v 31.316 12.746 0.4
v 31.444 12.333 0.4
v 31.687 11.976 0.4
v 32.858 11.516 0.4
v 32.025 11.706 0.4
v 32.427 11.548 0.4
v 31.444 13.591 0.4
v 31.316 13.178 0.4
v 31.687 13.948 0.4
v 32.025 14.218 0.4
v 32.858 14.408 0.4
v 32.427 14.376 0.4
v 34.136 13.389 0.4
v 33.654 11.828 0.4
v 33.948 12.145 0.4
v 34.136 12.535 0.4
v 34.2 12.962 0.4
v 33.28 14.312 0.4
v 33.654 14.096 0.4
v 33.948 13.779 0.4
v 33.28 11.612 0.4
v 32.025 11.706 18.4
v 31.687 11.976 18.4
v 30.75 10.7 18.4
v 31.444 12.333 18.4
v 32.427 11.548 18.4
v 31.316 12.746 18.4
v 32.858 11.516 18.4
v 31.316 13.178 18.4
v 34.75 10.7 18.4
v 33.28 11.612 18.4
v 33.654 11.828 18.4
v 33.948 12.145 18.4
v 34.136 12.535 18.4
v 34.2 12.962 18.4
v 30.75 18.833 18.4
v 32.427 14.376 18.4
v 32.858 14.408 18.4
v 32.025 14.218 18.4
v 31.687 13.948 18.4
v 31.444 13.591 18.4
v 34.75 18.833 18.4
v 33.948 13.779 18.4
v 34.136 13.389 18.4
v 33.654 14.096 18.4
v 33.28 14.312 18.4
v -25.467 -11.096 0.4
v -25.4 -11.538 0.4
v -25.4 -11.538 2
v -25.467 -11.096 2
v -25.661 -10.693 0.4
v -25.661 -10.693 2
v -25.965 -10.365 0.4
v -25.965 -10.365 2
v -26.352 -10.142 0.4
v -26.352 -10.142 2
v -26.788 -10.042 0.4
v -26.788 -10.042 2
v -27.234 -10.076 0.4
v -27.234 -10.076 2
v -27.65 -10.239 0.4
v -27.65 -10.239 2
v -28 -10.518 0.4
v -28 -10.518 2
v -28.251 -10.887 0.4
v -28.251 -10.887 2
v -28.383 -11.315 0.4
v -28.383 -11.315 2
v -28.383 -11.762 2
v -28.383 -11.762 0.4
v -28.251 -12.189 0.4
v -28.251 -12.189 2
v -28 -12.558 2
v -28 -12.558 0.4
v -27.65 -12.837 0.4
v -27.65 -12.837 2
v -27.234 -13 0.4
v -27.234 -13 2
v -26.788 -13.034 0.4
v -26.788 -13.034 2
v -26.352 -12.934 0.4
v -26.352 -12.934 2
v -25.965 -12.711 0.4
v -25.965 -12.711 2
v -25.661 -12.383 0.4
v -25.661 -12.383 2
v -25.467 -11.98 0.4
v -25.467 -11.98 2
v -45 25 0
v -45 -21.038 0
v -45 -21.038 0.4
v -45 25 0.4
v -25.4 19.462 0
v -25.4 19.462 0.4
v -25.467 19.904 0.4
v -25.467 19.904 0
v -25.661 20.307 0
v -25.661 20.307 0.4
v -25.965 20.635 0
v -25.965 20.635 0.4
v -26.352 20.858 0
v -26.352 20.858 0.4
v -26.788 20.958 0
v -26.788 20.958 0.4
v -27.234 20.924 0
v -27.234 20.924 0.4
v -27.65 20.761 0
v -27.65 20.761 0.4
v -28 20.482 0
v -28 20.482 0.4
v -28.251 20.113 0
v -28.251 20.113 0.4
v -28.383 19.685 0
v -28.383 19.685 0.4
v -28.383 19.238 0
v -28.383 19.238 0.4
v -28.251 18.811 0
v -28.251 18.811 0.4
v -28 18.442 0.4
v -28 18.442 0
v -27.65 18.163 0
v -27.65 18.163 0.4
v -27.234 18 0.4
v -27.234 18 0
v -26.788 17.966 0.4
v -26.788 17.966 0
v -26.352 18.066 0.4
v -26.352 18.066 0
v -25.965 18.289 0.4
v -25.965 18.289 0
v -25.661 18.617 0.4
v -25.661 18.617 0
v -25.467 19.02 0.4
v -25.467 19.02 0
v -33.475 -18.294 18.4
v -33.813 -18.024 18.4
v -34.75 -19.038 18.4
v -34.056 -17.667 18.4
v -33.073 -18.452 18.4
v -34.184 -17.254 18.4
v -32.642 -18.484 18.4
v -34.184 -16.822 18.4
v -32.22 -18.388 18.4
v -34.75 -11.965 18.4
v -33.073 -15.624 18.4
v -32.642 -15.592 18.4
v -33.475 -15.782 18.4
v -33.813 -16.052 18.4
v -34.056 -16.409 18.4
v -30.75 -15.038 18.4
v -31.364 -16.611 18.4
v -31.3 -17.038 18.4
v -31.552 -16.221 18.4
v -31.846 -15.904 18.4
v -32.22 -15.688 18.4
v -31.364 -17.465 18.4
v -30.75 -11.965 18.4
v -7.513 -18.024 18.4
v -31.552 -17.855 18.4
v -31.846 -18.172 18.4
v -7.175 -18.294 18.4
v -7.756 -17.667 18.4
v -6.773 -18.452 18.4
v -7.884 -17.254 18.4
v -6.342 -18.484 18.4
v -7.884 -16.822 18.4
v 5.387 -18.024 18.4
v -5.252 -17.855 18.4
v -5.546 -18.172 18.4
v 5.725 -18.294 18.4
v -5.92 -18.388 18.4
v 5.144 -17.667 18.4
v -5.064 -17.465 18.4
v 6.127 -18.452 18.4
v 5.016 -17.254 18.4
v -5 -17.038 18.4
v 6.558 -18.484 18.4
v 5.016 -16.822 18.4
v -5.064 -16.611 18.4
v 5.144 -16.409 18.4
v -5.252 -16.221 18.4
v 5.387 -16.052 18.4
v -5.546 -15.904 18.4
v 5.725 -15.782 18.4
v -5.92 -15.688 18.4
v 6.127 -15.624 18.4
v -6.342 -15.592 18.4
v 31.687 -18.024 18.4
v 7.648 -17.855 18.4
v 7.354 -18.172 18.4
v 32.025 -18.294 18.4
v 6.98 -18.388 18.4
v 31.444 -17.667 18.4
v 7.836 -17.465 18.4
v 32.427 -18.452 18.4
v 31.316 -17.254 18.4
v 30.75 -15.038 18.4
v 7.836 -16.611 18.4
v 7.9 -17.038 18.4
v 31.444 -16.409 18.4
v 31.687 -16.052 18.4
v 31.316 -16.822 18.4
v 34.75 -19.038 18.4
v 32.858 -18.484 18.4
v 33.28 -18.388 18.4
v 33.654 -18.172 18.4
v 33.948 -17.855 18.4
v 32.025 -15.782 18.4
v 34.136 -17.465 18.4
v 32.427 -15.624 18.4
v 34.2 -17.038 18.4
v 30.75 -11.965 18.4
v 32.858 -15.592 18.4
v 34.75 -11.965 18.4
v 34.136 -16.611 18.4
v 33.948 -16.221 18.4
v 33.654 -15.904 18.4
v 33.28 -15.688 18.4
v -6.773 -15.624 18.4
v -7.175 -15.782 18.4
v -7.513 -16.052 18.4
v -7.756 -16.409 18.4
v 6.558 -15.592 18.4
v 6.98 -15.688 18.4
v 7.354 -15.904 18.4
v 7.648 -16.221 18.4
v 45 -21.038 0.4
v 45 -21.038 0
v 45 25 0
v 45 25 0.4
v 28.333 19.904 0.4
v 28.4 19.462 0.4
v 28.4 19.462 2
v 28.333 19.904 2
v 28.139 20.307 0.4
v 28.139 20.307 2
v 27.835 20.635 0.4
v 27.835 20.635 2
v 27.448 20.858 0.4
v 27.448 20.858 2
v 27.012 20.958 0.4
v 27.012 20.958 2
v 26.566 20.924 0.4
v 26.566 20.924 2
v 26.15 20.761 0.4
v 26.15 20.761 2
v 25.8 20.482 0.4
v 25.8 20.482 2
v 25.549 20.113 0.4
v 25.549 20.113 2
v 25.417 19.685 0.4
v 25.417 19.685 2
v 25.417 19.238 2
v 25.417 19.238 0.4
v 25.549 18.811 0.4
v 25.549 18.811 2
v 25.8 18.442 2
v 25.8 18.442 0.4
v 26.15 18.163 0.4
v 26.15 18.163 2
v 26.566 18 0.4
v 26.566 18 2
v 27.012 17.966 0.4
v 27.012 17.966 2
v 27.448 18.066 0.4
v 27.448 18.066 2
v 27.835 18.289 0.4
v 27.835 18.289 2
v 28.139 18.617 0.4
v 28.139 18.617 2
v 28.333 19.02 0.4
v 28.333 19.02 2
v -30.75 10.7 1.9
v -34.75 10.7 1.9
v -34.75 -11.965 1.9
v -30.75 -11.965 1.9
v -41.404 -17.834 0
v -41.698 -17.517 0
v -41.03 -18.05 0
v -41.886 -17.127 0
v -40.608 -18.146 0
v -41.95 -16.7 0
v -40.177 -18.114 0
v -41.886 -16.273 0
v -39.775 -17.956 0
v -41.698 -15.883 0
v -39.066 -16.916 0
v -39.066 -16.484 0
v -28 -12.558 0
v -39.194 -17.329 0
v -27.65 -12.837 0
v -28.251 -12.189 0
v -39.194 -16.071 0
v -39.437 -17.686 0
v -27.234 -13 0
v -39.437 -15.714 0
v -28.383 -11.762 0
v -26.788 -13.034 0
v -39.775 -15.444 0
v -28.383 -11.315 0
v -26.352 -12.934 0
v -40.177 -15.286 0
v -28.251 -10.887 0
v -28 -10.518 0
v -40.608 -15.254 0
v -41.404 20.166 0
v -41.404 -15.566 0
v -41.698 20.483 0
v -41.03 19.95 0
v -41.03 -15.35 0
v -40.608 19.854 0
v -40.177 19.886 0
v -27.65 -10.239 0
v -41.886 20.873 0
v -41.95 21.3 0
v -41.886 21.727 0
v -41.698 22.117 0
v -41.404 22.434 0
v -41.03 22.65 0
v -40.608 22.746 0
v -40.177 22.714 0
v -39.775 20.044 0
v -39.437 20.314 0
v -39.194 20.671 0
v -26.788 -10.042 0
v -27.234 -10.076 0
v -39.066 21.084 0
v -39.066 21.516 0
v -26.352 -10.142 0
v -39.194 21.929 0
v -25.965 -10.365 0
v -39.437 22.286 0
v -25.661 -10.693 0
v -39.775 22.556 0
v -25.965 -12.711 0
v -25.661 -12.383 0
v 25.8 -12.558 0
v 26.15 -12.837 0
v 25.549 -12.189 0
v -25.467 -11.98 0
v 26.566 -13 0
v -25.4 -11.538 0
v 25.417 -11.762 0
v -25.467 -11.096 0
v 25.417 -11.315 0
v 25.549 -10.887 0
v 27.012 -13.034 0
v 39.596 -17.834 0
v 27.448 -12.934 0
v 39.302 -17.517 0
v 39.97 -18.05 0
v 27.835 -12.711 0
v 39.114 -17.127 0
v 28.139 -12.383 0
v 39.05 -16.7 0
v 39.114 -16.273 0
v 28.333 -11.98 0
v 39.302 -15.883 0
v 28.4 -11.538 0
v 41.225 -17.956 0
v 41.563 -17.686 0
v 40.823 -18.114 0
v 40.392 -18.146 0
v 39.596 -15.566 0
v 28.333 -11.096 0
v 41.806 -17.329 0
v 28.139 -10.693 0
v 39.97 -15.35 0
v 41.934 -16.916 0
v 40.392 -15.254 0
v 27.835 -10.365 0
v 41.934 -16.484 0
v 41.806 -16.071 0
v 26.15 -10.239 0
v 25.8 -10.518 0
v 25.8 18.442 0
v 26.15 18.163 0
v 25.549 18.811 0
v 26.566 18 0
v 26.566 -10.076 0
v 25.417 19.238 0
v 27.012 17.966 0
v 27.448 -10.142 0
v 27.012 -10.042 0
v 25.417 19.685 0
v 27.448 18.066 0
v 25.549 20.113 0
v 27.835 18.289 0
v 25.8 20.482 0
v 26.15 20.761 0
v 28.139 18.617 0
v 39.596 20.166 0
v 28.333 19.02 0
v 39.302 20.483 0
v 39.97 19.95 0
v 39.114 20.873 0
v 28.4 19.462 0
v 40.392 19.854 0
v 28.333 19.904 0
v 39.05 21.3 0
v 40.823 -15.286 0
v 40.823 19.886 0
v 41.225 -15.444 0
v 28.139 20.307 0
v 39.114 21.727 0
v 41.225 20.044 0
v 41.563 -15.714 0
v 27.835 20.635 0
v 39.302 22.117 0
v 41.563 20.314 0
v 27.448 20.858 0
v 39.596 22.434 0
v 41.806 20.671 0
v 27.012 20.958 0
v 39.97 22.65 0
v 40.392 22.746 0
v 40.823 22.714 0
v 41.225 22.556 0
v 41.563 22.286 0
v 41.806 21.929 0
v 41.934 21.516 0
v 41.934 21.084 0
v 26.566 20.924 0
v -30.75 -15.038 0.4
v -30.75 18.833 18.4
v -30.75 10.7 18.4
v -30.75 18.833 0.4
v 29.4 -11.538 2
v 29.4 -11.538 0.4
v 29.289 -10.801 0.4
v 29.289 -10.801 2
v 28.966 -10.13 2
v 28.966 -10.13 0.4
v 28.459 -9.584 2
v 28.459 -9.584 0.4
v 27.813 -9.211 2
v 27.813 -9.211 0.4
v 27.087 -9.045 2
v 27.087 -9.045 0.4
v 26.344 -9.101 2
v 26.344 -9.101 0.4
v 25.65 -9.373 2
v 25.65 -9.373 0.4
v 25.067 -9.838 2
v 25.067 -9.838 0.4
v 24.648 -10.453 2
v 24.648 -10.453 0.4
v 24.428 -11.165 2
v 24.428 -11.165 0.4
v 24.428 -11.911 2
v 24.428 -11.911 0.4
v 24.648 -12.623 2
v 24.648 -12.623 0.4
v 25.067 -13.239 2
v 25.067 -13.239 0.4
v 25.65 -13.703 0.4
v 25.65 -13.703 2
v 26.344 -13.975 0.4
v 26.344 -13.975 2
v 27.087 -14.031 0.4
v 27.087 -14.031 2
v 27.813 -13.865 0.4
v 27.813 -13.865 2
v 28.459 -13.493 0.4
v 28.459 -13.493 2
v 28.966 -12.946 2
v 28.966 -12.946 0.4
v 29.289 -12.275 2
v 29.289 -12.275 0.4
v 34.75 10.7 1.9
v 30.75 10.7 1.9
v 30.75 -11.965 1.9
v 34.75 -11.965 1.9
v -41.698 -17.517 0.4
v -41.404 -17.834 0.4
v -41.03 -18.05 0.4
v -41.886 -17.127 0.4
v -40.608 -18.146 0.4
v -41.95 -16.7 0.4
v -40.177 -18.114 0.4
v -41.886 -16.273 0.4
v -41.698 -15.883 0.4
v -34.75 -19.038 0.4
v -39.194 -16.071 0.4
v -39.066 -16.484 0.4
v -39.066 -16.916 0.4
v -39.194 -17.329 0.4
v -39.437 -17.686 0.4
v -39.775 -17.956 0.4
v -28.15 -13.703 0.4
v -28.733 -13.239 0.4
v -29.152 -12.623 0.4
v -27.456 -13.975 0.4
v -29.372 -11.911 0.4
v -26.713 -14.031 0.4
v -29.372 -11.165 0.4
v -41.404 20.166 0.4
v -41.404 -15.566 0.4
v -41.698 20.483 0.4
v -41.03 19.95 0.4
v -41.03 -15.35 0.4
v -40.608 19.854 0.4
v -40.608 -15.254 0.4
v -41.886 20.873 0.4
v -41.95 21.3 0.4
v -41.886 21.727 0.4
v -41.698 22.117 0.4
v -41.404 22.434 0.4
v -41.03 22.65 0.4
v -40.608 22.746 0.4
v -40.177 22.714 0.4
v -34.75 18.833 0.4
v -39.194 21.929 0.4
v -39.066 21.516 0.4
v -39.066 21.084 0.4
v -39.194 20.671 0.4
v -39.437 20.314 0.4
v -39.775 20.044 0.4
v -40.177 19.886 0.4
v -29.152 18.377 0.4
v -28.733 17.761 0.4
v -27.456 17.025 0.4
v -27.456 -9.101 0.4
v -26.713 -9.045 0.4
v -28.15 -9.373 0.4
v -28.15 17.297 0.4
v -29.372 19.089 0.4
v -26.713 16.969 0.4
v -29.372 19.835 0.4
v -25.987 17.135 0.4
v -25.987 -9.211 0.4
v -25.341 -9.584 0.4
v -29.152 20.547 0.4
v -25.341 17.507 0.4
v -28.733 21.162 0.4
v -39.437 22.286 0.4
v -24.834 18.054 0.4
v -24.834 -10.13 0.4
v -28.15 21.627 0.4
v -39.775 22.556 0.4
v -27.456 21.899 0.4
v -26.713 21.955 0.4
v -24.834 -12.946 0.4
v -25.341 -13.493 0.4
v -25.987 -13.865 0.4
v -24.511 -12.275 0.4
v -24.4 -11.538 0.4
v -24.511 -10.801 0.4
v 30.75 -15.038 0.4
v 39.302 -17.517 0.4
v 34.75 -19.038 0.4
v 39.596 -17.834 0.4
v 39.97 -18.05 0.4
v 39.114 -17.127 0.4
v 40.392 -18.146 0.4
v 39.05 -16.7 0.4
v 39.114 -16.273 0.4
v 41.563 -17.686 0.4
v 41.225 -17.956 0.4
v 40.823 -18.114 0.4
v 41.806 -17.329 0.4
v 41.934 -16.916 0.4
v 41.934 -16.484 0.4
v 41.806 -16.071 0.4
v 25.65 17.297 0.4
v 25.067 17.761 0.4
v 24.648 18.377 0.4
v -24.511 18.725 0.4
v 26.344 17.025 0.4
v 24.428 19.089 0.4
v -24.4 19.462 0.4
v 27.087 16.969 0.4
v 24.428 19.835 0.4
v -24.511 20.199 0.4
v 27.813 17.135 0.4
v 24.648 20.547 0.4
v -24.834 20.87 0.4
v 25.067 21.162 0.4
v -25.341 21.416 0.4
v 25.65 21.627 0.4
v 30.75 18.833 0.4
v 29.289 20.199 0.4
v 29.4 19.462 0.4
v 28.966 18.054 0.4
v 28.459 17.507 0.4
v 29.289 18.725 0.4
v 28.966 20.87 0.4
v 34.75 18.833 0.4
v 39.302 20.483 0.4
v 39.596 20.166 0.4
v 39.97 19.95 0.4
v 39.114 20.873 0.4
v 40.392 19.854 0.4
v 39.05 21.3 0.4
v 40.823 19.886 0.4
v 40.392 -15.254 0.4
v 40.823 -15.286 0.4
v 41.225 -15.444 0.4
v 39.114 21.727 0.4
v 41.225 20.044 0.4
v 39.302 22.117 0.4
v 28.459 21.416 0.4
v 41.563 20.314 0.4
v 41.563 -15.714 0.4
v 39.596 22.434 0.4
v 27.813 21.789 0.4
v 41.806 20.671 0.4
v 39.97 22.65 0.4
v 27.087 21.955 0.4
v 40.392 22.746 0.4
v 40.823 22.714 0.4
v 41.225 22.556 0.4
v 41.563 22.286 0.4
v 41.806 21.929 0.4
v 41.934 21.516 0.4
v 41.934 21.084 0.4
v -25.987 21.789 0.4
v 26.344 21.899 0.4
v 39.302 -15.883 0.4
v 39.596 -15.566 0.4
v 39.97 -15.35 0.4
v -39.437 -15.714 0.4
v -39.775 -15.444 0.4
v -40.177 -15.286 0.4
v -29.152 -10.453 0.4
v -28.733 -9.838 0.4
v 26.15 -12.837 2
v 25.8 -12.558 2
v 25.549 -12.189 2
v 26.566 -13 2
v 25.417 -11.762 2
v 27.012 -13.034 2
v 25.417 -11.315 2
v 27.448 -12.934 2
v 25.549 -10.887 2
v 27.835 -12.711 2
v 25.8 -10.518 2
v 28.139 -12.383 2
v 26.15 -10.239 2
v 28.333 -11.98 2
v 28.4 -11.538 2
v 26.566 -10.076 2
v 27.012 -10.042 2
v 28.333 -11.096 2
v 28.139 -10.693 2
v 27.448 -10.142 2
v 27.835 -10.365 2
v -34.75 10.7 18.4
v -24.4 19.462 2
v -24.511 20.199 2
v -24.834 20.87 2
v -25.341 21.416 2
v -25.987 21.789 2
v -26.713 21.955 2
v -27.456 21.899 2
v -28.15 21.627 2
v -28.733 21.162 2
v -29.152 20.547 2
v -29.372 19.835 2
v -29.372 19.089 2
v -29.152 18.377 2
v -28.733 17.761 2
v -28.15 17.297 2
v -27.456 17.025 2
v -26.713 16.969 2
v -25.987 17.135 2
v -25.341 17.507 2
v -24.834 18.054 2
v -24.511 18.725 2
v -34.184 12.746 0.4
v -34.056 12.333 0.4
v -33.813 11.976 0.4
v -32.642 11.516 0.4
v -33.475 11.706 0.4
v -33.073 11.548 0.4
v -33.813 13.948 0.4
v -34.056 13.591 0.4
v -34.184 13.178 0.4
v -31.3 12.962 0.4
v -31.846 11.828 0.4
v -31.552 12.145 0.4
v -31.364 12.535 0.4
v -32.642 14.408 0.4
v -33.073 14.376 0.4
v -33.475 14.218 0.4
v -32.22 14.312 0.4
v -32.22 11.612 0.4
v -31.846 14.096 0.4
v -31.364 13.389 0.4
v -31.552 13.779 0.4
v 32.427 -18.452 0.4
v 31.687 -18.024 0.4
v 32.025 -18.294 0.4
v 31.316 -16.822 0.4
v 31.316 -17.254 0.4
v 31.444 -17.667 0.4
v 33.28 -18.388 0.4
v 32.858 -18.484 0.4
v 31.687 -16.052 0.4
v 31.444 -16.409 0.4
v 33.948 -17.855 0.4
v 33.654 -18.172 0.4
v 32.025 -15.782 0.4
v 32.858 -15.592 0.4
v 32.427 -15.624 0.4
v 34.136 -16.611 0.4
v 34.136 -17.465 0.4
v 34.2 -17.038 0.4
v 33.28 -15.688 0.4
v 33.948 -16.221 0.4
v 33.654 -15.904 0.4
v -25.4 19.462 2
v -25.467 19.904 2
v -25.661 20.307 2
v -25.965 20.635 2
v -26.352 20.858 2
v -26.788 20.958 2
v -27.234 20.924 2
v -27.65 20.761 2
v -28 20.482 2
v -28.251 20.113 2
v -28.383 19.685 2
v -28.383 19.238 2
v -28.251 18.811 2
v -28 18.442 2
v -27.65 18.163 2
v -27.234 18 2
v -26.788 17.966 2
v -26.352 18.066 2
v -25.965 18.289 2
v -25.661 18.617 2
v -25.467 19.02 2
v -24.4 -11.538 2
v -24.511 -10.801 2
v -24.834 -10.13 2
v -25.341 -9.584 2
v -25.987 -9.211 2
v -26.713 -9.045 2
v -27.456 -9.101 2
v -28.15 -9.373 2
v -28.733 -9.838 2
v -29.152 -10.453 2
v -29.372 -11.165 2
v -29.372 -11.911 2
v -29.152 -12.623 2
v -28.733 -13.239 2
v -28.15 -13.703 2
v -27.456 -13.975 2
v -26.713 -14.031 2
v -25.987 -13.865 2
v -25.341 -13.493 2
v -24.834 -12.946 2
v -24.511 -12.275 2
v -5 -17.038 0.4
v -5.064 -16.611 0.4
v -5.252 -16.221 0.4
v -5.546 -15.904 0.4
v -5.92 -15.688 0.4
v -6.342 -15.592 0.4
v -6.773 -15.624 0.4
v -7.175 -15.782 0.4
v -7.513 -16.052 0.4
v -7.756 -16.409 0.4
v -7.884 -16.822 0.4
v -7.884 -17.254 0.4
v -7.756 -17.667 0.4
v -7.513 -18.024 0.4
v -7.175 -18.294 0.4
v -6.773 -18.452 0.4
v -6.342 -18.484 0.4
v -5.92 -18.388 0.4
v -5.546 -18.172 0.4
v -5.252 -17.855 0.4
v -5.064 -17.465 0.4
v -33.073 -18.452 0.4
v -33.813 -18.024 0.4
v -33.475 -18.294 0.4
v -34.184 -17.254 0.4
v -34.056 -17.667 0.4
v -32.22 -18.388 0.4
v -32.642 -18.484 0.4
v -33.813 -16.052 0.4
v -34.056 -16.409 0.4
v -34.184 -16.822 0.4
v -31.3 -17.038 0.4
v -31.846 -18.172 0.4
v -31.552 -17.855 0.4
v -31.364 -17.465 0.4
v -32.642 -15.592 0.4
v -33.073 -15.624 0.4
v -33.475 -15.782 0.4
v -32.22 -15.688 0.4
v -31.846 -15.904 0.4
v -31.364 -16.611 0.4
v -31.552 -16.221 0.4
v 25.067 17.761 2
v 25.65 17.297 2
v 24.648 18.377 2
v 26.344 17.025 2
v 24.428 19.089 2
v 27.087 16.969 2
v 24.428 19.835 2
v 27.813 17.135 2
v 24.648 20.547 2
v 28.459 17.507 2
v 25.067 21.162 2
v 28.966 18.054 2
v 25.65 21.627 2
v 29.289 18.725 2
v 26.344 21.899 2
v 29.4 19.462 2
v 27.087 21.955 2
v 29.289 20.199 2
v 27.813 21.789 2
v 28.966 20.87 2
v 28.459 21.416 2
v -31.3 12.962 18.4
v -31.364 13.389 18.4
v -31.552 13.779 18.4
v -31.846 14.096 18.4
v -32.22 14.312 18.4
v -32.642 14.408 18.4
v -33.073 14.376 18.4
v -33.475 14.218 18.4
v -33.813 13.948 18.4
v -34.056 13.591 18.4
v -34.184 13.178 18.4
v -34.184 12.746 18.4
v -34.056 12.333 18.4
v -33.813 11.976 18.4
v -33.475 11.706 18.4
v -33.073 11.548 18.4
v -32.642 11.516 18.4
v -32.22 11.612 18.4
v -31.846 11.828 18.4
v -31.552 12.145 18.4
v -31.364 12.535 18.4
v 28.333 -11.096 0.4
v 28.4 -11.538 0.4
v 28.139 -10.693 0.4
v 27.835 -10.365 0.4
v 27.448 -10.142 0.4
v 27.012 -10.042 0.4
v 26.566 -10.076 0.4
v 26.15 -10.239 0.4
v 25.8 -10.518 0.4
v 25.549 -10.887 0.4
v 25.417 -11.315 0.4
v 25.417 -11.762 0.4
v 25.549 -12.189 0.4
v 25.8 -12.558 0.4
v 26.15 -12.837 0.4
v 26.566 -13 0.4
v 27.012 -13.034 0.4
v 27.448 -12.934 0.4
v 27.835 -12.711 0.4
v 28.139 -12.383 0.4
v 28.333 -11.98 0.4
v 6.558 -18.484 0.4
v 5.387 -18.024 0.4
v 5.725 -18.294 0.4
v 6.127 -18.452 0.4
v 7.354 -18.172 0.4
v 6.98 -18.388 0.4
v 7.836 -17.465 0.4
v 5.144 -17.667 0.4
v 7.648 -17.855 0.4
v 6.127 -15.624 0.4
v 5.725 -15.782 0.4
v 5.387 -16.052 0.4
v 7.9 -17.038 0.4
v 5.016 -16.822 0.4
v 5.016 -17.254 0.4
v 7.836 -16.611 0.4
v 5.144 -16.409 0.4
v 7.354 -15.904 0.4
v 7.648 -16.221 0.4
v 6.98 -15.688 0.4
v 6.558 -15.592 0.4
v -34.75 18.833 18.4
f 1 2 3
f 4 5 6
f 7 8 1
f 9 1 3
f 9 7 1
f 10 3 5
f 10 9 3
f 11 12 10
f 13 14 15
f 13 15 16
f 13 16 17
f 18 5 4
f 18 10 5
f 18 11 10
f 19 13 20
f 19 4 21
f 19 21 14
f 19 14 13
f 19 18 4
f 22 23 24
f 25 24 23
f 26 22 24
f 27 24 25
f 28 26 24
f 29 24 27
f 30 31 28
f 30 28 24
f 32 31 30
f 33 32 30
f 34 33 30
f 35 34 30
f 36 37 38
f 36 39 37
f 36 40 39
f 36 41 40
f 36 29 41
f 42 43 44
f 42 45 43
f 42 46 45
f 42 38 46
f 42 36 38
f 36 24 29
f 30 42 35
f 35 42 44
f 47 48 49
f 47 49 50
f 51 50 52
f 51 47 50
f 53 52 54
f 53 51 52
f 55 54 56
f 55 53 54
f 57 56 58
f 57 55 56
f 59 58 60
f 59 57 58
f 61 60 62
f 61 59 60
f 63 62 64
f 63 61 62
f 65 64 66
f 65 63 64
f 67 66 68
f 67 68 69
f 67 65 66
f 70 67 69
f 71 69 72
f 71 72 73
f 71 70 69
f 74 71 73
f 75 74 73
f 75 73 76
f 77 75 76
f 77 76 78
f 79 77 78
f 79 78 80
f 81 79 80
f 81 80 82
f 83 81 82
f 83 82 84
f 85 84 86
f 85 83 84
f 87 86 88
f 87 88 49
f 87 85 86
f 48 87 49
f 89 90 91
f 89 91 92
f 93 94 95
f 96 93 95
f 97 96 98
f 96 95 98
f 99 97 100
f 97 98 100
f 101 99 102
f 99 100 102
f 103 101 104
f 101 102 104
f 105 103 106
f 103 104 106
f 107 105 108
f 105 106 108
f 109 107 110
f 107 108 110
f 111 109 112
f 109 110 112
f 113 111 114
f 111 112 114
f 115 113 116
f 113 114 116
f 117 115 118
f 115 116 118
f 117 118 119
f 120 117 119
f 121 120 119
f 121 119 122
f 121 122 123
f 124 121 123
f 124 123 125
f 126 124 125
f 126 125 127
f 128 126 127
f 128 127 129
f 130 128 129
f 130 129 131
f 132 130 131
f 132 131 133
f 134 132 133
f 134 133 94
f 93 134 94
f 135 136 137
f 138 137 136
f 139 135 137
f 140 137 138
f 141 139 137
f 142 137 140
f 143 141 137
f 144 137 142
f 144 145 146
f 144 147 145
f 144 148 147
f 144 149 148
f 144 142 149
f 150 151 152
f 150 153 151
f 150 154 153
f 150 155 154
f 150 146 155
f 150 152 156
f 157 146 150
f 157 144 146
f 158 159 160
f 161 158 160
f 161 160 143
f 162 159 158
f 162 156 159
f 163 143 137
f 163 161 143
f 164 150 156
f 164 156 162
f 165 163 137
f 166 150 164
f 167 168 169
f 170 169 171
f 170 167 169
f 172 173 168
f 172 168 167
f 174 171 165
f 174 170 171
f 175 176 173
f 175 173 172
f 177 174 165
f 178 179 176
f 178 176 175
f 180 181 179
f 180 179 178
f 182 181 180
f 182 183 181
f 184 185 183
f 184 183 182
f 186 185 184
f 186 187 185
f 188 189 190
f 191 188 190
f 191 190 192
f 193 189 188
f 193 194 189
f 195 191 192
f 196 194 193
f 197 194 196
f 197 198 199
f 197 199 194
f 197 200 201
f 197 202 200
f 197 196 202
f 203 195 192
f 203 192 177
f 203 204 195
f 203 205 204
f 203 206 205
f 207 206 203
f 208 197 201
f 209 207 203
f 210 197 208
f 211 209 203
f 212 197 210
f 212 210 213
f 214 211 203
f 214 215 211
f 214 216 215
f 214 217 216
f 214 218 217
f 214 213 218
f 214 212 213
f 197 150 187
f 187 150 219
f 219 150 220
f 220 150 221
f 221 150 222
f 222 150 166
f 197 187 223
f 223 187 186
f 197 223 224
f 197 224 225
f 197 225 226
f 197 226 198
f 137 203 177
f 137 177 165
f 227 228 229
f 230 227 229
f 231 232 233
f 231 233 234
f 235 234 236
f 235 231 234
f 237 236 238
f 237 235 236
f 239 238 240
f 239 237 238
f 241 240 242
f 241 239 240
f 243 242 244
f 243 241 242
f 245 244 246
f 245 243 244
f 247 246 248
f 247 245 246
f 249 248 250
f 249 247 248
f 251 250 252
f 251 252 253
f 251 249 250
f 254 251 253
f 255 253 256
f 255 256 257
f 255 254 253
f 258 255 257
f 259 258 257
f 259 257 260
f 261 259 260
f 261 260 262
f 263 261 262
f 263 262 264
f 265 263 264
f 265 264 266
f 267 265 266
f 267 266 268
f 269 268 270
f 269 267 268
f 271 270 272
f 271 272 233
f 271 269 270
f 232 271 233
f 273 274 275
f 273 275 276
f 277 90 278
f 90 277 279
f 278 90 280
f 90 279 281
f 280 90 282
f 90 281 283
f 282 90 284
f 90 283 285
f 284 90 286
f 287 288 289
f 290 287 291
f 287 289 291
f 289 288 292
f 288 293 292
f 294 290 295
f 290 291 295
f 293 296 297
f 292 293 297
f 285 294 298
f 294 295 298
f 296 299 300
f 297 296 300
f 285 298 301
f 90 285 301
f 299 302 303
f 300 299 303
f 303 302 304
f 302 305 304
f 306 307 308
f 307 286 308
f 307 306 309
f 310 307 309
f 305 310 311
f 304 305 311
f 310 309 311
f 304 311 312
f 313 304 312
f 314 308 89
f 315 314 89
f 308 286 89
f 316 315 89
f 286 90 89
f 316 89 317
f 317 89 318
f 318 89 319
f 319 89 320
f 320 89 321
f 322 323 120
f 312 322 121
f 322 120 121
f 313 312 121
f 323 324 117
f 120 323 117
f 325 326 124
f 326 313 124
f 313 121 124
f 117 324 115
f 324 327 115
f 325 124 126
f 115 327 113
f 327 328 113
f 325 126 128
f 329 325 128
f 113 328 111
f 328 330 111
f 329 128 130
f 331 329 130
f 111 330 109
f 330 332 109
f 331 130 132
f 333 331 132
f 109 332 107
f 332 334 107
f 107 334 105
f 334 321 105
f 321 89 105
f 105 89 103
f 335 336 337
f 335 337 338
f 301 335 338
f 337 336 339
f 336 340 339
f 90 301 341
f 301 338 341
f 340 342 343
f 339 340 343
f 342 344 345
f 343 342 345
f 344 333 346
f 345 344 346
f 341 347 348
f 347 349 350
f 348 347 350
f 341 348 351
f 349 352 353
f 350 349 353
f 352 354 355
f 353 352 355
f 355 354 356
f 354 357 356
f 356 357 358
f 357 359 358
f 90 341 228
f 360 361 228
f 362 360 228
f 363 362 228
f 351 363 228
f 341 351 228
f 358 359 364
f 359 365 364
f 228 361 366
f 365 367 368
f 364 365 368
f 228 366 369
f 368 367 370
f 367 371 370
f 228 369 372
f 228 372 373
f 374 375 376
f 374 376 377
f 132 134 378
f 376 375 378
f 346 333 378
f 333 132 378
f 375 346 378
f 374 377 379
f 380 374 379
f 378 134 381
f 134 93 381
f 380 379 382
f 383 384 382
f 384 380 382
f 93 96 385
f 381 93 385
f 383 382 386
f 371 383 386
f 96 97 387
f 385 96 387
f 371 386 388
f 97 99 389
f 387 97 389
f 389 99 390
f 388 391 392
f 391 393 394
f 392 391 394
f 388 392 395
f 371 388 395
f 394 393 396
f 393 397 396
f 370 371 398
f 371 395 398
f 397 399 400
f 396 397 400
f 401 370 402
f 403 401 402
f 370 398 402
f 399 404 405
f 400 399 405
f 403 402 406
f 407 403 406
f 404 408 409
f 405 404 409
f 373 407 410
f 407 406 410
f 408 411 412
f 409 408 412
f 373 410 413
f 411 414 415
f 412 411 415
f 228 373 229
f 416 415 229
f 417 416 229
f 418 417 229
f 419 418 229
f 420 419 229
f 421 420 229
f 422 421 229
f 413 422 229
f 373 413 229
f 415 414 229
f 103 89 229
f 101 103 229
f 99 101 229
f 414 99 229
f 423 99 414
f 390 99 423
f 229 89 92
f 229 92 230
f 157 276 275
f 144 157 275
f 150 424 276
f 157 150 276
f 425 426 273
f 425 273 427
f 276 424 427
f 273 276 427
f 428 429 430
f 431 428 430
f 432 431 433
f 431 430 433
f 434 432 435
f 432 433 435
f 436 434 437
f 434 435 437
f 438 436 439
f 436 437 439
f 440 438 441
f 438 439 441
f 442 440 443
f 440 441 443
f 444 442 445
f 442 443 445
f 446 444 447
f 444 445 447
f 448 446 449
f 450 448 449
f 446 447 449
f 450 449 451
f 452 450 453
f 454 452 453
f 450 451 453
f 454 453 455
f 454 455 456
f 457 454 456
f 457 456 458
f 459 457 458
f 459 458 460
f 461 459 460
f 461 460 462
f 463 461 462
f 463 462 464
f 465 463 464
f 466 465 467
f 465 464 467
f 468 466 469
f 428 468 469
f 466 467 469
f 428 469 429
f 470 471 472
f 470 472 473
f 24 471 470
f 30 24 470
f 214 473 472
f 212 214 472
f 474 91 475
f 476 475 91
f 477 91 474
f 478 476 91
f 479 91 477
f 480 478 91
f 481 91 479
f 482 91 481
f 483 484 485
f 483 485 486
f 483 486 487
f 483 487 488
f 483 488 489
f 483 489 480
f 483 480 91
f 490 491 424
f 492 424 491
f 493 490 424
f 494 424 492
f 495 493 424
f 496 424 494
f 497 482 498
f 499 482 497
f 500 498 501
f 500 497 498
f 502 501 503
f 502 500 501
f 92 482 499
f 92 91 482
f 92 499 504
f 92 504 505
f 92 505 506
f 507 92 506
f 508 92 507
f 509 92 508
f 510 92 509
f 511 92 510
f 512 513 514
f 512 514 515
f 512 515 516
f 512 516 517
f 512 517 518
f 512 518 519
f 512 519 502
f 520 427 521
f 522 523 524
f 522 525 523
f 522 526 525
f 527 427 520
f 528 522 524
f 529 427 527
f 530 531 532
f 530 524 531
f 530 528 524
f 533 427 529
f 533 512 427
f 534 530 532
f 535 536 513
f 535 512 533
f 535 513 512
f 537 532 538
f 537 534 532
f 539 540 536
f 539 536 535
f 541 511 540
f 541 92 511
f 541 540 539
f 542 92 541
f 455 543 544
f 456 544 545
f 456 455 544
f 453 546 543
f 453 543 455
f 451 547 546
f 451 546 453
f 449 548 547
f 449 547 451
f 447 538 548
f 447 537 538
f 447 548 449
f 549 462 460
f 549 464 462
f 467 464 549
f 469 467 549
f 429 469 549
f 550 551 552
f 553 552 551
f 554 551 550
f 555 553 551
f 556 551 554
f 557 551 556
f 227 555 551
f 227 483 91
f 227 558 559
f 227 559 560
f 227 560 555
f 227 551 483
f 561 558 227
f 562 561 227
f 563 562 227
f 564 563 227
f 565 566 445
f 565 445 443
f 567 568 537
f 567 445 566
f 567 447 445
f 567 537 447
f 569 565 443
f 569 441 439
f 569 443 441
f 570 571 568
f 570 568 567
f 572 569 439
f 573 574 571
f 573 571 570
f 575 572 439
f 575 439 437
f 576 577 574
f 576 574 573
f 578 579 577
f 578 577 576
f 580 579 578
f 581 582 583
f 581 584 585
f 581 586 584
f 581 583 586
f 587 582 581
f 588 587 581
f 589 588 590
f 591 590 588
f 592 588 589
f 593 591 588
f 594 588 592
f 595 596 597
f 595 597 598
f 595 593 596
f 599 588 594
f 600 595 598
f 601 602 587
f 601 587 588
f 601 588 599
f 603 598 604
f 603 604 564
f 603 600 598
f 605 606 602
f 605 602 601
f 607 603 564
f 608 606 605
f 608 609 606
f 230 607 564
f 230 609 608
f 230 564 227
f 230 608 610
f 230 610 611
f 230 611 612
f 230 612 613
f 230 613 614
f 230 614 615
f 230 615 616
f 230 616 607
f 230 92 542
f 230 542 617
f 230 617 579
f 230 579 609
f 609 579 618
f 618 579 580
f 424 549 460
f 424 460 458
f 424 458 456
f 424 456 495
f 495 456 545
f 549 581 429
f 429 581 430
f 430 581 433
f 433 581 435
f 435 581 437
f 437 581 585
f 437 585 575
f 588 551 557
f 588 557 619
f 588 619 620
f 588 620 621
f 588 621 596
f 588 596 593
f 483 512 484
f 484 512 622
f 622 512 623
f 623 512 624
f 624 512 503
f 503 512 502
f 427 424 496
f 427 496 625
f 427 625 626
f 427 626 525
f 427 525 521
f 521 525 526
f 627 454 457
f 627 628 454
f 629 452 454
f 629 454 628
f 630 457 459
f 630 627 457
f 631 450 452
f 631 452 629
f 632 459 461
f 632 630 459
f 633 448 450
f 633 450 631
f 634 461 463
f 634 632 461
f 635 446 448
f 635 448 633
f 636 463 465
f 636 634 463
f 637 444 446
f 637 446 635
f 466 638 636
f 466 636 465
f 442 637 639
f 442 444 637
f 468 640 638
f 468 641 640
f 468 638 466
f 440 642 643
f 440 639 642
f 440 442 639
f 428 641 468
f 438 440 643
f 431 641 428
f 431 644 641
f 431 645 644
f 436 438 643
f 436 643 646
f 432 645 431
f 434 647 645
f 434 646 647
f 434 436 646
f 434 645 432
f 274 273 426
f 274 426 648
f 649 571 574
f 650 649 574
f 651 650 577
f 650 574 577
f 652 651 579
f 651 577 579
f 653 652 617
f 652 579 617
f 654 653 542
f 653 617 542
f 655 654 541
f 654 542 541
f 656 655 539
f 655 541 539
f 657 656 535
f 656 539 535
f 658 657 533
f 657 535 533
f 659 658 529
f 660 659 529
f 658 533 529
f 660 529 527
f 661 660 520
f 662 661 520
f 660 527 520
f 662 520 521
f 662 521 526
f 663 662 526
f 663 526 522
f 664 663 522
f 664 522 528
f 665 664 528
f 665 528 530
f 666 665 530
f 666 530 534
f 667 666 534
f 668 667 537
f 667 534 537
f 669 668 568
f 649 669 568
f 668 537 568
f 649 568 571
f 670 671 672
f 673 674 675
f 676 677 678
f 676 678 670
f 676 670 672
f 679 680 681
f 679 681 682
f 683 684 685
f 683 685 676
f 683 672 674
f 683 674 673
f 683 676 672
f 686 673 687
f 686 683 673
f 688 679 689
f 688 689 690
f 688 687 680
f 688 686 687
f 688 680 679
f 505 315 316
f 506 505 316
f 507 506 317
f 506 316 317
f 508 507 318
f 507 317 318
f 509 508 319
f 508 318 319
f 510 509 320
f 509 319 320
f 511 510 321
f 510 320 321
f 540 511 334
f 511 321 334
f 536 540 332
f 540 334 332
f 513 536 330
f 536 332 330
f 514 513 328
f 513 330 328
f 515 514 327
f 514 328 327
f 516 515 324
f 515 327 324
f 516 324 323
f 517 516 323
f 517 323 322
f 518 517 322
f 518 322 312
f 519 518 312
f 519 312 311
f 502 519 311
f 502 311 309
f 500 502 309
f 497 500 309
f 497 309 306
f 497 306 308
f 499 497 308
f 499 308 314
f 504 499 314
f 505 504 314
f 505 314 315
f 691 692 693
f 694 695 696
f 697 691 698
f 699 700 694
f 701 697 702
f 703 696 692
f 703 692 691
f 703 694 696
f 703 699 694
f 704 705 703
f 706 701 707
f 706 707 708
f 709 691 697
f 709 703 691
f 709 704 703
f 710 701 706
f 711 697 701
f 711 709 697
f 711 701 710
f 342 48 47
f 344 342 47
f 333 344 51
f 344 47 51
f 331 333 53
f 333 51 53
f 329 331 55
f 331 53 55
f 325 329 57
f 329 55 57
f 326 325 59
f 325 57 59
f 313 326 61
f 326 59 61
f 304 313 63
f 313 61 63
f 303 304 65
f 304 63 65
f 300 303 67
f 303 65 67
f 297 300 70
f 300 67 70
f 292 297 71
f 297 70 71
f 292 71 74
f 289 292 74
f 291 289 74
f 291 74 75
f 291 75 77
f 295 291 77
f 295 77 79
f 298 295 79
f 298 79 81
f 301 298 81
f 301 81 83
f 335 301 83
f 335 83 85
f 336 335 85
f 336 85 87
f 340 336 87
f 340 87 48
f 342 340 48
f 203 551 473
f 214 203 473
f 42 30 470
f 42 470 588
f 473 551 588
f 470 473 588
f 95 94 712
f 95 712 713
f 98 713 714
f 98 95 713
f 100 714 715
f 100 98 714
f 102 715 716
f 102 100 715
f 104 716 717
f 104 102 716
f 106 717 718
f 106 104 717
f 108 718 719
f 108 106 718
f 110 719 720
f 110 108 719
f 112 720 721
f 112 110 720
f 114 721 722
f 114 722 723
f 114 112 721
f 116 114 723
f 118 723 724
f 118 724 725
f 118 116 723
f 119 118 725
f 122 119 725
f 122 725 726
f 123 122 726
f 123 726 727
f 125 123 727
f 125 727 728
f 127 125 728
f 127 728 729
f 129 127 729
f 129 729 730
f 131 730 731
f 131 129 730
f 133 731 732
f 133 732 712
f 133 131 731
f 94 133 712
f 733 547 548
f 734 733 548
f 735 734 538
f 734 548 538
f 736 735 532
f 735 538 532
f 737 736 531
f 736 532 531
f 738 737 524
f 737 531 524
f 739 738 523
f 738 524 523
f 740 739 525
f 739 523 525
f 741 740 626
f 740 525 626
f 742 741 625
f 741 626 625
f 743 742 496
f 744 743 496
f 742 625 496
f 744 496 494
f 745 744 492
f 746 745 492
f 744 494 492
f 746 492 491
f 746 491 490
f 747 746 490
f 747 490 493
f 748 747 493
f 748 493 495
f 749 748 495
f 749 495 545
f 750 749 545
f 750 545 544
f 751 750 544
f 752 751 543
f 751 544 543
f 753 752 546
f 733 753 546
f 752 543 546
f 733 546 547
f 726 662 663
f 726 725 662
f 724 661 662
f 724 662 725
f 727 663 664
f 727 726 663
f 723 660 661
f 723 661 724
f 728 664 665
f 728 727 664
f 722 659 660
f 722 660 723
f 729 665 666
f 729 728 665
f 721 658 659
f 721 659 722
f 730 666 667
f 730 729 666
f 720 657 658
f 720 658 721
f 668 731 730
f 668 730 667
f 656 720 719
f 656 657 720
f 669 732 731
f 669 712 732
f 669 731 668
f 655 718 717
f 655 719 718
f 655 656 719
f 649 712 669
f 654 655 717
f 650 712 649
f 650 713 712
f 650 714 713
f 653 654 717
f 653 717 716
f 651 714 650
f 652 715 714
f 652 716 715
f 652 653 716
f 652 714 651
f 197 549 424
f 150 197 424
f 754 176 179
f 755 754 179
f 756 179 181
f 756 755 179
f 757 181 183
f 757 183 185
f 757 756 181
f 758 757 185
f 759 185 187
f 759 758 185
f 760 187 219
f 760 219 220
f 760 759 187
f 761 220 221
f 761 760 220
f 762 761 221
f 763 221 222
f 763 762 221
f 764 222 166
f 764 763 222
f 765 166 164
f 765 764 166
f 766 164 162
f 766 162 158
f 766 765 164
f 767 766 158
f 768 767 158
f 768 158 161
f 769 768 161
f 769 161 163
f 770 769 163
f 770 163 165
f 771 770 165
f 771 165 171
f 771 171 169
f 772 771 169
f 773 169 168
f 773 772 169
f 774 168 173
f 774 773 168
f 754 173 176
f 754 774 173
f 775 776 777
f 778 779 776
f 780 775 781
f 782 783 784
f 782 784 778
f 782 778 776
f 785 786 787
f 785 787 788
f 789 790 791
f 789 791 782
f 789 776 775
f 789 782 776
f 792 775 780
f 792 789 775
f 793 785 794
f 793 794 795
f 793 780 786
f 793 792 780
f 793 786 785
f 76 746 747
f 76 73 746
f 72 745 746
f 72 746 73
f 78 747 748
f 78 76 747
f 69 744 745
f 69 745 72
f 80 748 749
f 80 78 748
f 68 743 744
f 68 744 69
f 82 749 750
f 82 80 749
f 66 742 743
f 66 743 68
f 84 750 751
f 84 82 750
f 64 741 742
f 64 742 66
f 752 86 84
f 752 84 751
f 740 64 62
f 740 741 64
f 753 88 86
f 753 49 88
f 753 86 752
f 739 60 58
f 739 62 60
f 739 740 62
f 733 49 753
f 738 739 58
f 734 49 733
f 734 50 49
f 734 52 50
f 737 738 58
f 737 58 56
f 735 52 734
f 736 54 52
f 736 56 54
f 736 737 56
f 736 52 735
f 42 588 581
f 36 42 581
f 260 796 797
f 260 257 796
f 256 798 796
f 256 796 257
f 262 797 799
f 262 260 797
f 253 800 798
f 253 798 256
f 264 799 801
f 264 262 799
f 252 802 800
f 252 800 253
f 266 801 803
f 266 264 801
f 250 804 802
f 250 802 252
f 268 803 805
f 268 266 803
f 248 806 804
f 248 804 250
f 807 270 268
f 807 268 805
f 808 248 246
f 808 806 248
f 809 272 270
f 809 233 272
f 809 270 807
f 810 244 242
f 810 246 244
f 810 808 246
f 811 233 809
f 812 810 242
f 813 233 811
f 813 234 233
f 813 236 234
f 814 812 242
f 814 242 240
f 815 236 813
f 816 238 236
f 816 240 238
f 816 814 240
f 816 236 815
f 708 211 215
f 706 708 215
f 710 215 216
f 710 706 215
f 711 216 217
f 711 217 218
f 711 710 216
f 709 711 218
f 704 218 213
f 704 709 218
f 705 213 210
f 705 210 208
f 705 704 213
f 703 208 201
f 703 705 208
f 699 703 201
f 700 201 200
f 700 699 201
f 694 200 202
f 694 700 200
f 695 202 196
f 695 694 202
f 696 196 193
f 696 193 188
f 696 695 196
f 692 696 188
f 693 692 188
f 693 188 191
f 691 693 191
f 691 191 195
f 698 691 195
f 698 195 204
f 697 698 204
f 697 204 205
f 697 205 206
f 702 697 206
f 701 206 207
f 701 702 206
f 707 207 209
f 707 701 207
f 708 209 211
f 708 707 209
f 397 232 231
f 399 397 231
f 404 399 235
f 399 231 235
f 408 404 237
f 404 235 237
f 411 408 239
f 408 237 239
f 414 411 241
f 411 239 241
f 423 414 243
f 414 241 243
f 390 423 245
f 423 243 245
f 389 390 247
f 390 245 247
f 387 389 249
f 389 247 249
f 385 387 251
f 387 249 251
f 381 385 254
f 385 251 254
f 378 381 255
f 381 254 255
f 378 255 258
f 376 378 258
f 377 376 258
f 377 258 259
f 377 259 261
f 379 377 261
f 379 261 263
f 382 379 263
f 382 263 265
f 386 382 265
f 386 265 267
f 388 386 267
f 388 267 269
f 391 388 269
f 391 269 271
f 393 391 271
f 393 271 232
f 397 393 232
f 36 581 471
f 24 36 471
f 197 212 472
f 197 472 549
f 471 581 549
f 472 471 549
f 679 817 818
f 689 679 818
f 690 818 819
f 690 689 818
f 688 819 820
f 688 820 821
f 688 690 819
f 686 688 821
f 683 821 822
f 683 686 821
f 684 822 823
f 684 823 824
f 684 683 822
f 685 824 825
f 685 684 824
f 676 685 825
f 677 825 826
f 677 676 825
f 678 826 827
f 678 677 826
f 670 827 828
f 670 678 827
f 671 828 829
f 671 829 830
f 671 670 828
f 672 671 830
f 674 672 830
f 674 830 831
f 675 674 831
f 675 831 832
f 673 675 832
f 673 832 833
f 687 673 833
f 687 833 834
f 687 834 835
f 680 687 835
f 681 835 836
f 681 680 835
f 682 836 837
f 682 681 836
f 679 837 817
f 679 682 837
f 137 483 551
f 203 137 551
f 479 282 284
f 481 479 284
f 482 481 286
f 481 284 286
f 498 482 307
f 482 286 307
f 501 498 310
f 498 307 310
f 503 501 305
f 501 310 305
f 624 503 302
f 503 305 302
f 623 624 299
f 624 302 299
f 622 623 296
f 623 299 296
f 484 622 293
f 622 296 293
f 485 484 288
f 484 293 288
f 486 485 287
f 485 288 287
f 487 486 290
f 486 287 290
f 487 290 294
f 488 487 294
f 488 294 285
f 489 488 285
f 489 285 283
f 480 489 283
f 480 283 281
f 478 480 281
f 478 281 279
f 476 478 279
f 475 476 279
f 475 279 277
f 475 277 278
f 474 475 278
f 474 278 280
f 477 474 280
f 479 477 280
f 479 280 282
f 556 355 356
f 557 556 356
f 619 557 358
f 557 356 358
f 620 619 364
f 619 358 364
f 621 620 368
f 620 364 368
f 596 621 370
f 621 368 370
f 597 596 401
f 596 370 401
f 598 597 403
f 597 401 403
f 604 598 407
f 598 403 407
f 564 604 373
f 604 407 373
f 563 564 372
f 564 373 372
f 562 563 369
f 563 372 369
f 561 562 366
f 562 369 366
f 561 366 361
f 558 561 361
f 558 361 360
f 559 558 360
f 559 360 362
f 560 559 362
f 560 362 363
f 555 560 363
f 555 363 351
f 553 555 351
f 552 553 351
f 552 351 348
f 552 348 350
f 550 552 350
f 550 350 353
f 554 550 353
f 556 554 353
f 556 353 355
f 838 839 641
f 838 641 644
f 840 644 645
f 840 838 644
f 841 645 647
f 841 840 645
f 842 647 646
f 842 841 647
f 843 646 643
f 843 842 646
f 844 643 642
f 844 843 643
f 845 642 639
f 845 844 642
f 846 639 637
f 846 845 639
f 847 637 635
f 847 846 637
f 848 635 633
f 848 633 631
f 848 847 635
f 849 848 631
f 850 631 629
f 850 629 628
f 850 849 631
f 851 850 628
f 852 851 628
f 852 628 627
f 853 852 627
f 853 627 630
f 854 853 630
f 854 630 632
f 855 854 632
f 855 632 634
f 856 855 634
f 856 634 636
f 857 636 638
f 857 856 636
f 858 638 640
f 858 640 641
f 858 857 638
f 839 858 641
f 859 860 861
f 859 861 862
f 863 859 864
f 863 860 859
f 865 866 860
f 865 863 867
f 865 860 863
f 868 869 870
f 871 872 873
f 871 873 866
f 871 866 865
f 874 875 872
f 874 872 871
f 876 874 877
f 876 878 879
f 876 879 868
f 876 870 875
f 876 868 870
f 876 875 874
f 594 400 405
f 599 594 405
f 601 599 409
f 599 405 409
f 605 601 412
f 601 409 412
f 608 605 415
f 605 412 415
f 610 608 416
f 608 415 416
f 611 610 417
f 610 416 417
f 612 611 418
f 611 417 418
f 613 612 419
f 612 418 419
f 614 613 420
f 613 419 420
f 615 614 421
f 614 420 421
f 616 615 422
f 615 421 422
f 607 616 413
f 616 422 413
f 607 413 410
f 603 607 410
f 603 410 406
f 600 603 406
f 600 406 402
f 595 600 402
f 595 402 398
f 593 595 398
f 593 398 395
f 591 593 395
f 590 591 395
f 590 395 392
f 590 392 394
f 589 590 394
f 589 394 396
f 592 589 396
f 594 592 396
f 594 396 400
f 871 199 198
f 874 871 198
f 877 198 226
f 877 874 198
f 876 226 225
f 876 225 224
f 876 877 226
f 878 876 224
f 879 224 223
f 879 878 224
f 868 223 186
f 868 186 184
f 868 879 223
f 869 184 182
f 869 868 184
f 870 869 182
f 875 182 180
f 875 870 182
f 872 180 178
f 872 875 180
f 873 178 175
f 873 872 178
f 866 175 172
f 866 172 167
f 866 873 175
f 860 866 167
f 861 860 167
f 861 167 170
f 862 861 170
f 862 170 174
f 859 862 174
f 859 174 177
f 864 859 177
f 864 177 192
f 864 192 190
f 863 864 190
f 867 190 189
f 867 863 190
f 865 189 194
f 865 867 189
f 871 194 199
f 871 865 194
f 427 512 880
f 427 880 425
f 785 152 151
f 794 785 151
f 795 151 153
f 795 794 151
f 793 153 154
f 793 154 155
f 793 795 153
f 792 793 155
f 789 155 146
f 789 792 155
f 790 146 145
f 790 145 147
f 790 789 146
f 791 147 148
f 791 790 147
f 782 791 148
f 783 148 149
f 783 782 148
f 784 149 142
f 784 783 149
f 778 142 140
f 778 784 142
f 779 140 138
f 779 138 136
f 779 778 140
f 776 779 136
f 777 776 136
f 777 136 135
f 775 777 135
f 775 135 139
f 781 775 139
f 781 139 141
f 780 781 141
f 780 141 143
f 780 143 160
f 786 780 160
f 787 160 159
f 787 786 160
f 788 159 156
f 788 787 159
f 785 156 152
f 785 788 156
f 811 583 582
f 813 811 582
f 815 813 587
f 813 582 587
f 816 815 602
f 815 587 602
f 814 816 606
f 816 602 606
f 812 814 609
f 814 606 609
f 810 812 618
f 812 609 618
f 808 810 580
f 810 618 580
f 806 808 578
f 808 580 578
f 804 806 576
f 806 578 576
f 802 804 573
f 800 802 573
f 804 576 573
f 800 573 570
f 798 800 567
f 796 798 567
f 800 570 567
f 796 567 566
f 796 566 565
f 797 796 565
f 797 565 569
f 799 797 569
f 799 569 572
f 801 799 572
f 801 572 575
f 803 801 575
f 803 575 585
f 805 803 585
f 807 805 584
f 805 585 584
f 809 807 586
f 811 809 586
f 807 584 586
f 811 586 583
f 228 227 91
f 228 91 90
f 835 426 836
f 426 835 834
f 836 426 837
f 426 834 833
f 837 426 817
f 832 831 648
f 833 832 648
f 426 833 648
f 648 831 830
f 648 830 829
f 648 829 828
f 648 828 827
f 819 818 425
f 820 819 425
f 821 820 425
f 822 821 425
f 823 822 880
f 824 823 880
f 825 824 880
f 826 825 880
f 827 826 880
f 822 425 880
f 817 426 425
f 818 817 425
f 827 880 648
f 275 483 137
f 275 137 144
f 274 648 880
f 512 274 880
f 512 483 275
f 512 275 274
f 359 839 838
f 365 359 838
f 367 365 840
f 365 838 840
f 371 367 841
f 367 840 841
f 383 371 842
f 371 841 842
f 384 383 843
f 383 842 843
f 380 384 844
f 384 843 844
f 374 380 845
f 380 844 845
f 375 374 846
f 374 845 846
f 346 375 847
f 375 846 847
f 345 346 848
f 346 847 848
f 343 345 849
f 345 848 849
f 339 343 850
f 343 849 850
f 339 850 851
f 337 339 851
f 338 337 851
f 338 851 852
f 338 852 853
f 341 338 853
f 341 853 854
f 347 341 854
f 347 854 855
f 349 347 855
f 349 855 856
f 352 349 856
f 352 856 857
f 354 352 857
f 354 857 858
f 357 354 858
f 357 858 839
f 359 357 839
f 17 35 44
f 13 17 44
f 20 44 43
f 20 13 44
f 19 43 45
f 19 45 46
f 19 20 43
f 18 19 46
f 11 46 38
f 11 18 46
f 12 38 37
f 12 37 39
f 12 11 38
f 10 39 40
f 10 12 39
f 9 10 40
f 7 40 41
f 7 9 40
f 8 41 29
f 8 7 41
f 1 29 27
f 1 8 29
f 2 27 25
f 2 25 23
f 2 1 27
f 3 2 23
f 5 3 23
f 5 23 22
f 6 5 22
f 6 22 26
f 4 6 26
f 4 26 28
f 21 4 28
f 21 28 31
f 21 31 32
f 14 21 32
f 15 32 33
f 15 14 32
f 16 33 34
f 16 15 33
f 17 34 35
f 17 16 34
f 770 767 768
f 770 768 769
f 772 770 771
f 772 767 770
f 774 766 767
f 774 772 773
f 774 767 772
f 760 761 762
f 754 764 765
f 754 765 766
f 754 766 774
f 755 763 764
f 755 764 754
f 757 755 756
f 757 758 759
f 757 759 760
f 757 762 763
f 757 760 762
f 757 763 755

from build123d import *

# Parameters (mm, degrees)
SKIZZE1_W                       = 90
SKIZZE1_H                       = 50
AUFSATZ_LINEAR_AUSTRAGEN1_DEPTH = 0.4
SKIZZE3_R                       = 1.5
SCHNITT_LINEAR_AUSTRAGEN1_DEPTH = 1.4
SKIZZE18_R                      = 2.5
SKIZZE18_R_2                    = 1.5
AUFSATZ_LINEAR_AUSTRAGEN5_DEPTH = 1.6
SKIZZE22_R                      = 1.45
AUFSATZ_LINEAR_AUSTRAGEN7_DEPTH = 18
SKIZZE24_W                      = 4
SKIZZE24_H                      = 22.665276743
AUFSATZ_LINEAR_AUSTRAGEN8_DEPTH = 1.5
SKIZZE25_W                      = 0.4
SKIZZE25_H                      = 3.961895835
SCHNITT_LINEAR_AUSTRAGEN4_DEPTH = 91
SKIZZE26_R                      = 1.45
SCHNITT_LINEAR_AUSTRAGEN5_DEPTH = 1


with BuildPart() as part:
    # Skizze1 → Aufsatz-Linear austragen1 (new body)
    with BuildSketch(Plane.XY):
        Rectangle(SKIZZE1_W, SKIZZE1_H)
    extrude(amount=AUFSATZ_LINEAR_AUSTRAGEN1_DEPTH)

    # Skizze3 → Schnitt-Linear austragen1 (cut, through all)
    with BuildSketch(Plane.XY.offset(0.4)):
        with Locations((-26.9, 19.461895835)):
            Circle(SKIZZE3_R)
        with Locations((26.9, 19.461895835)):
            Circle(SKIZZE3_R)
        with Locations((26.9, -11.538104165)):
            Circle(SKIZZE3_R)
        with Locations((-26.9, -11.538104165)):
            Circle(SKIZZE3_R)
    extrude(amount=-SCHNITT_LINEAR_AUSTRAGEN1_DEPTH, mode=Mode.SUBTRACT)

    # Skizze18 → Aufsatz-Linear austragen5 (add)
    with BuildSketch(Plane.XY.offset(0.4)):
        with Locations((-26.9, 19.461895835)):
            Circle(SKIZZE18_R)
        with Locations((-26.9, 19.461895835)):
            Circle(SKIZZE18_R_2, mode=Mode.SUBTRACT)
        with Locations((26.9, 19.461895835)):
            Circle(SKIZZE18_R)
        with Locations((26.9, 19.461895835)):
            Circle(SKIZZE18_R_2, mode=Mode.SUBTRACT)
        with Locations((26.9, -11.538104165)):
            Circle(SKIZZE18_R)
        with Locations((26.9, -11.538104165)):
            Circle(SKIZZE18_R_2, mode=Mode.SUBTRACT)
        with Locations((-26.9, -11.538104165)):
            Circle(SKIZZE18_R)
        with Locations((-26.9, -11.538104165)):
            Circle(SKIZZE18_R_2, mode=Mode.SUBTRACT)
    extrude(amount=AUFSATZ_LINEAR_AUSTRAGEN5_DEPTH)

    # Skizze22 → Aufsatz-Linear austragen7 (add)
    with BuildSketch(Plane.XY.offset(0.4)):
        Polygon((30.75, -15.038104165), (0, -15.038104165), (-30.75, -15.038104165), (-30.75, -11.965150571), (-34.75, -11.965150571), (-34.75, -19.038104165), (0, -19.038104165), (34.75, -19.038104165), (34.75, -11.965150571), (30.75, -11.965150571), align=None)
        with Locations((32.75, -17.038104165)):
            Circle(SKIZZE22_R, mode=Mode.SUBTRACT)
        with Locations((6.45, -17.038104165)):
            Circle(SKIZZE22_R, mode=Mode.SUBTRACT)
        with Locations((-6.45, -17.038104165)):
            Circle(SKIZZE22_R, mode=Mode.SUBTRACT)
        with Locations((-32.75, -17.038104165)):
            Circle(SKIZZE22_R, mode=Mode.SUBTRACT)
        Polygon((34.75, 15.223665498), (34.75, 18.83332796), (30.75, 18.83332796), (30.75, 15.223665498), (30.75, 10.700126172), (34.75, 10.700126172), align=None)
        with Locations((32.75, 12.961895835)):
            Circle(SKIZZE22_R, mode=Mode.SUBTRACT)
        Polygon((-30.75, 18.83332796), (-30.75, 15.223665498), (-30.75, 10.700126172), (-34.75, 10.700126172), (-34.75, 15.223665498), (-34.75, 18.83332796), align=None)
        with Locations((-32.75, 12.961895835)):
            Circle(SKIZZE22_R, mode=Mode.SUBTRACT)
    extrude(amount=AUFSATZ_LINEAR_AUSTRAGEN7_DEPTH)

    # Skizze24 → Aufsatz-Linear austragen8 (add)
    with BuildSketch(Plane.XY.offset(0.4)):
        with Locations((-32.75, -0.632512199)):
            Rectangle(SKIZZE24_W, SKIZZE24_H)
        with Locations((32.75, -0.632512199)):
            Rectangle(SKIZZE24_W, SKIZZE24_H)
    extrude(amount=AUFSATZ_LINEAR_AUSTRAGEN8_DEPTH)

    # Skizze25 → Schnitt-Linear austragen4 (cut, through all)
    with BuildSketch(Plane(origin=(45, 0, 0), x_dir=(0, 0, -1), z_dir=(1, 0, 0))):
        with Locations((-0.2, -23.019052083)):
            Rectangle(SKIZZE25_W, SKIZZE25_H)
    extrude(amount=-SCHNITT_LINEAR_AUSTRAGEN4_DEPTH, mode=Mode.SUBTRACT)

    # Skizze26 → Schnitt-Linear austragen5 (cut)
    with BuildSketch(Plane(origin=(0, 0, 0), x_dir=(-1, 0, 0), z_dir=(0, 0, -1))):
        with Locations((-40.5, -16.7)):
            Circle(SKIZZE26_R)
        with Locations((-40.5, 21.3)):
            Circle(SKIZZE26_R)
        with Locations((40.5, -16.7)):
            Circle(SKIZZE26_R)
        with Locations((40.5, 21.3)):
            Circle(SKIZZE26_R)
    extrude(amount=-SCHNITT_LINEAR_AUSTRAGEN5_DEPTH, mode=Mode.SUBTRACT)


solid = part.part
